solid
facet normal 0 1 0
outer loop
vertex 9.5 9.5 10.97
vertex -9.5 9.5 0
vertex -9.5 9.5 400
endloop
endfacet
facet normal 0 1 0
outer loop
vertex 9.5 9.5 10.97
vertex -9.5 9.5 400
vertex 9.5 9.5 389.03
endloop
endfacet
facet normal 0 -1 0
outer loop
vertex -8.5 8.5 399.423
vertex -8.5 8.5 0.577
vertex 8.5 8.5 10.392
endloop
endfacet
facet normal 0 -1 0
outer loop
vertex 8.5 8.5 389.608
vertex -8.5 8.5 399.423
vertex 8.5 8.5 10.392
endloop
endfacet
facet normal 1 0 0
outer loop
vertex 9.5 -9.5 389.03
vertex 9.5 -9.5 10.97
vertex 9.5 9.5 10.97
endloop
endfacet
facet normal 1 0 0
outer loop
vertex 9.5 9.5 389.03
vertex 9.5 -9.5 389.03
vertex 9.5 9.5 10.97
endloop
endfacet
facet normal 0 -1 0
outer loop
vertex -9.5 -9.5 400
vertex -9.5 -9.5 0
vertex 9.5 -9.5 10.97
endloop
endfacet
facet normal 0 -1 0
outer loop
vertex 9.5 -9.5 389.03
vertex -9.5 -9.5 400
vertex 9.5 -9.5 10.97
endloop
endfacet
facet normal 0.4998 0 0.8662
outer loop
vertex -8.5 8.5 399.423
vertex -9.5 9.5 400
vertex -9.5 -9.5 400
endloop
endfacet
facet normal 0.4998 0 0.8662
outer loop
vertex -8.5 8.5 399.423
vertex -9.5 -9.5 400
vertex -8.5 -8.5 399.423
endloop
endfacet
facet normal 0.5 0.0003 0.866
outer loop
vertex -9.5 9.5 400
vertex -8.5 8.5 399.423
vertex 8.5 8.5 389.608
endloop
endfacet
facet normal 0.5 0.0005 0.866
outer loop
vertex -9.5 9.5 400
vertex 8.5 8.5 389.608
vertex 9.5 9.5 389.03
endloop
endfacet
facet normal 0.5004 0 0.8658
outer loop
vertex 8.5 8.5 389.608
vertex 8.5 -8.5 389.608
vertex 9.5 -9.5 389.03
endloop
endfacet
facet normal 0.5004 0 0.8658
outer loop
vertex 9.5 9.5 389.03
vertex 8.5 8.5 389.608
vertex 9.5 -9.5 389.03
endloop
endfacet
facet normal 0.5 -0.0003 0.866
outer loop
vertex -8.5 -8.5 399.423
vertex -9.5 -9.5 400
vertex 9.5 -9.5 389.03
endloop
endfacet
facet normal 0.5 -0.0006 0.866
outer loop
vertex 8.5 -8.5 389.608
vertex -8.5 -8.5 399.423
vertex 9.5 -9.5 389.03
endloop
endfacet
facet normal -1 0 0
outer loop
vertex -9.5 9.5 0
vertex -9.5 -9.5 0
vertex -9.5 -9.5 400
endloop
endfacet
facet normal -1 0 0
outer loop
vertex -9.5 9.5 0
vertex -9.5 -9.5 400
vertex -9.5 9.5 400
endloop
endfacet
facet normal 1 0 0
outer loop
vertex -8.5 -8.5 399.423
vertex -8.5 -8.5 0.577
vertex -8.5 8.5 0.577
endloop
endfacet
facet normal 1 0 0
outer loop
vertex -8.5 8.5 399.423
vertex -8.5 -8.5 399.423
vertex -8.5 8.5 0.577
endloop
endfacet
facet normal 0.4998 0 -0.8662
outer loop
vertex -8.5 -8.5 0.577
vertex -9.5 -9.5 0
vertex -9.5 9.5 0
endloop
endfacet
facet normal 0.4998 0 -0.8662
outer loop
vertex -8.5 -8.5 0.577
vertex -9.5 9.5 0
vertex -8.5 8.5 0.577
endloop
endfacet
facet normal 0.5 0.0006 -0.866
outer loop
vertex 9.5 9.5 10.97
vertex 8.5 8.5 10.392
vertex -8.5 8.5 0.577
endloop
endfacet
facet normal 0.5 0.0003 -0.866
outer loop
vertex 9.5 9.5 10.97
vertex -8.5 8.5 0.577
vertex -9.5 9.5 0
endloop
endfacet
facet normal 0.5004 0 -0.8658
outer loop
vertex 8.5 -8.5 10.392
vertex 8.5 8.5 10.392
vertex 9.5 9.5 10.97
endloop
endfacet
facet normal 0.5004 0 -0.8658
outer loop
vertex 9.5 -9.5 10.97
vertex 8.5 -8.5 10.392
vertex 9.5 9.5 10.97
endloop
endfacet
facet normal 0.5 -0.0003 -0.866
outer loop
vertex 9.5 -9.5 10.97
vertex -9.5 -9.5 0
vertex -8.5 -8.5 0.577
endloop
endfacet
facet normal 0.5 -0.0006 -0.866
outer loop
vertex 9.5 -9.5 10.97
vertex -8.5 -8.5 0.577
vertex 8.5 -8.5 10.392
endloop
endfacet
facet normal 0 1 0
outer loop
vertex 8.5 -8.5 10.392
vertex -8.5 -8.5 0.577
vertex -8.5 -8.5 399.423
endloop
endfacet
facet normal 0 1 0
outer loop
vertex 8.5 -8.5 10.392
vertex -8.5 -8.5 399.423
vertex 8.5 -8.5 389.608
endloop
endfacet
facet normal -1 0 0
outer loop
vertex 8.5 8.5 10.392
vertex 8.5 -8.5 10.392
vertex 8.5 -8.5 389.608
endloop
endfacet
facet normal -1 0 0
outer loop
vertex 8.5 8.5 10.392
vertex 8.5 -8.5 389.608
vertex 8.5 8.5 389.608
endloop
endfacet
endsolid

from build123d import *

# Parameters (mm, degrees)
SKETCH1_W               = 19
SKETCH1_H               = 19
SKETCH1_W_2             = 17
SKETCH1_H_2             = 17
BOSS_EXTRUDE1_DEPTH     = 400
CUT_EXTRUDE3_DEPTH      = 1
CUT_EXTRUDE3_DEPTH_BACK = 20
CUT_EXTRUDE4_DEPTH      = 1
CUT_EXTRUDE4_DEPTH_BACK = 20


with BuildPart() as part:
    # Sketch1 → Boss-Extrude1 (new body)
    with BuildSketch(Plane.XY):
        Rectangle(SKETCH1_W, SKETCH1_H)
        Rectangle(SKETCH1_W_2, SKETCH1_H_2, mode=Mode.SUBTRACT)
    extrude(amount=BOSS_EXTRUDE1_DEPTH)

    # Sketch2 → Cut-Extrude3 (cut, two sides)
    with BuildSketch(Plane.XZ.offset(9.5)) as cut_extrude3_sk:
        Polygon((-711.761724625, -405.450995754), (-9.5, 0), (9.5, 10.969655115), (711.761724625, 416.420650868), (1522.663716132, -988.102798381), (99.140266883, -1809.974445003), align=None)
    extrude(amount=CUT_EXTRUDE3_DEPTH, mode=Mode.SUBTRACT)
    extrude(cut_extrude3_sk.sketch, amount=-CUT_EXTRUDE3_DEPTH_BACK, mode=Mode.SUBTRACT)

    # Sketch3 → Cut-Extrude4 (cut, two sides)
    with BuildSketch(Plane(origin=(0, -9.5, 0), x_dir=(-1, 0, 0), z_dir=(0, -1, 0))) as cut_extrude4_sk:
        Polygon((711.761724625, -805.450995754), (9.5, -400), (-9.5, -389.030344885), (-711.761724625, 16.420650868), (-1522.663716132, -1388.102798381), (-99.140266883, -2209.974445003), align=None)
    extrude(amount=CUT_EXTRUDE4_DEPTH, mode=Mode.SUBTRACT)
    extrude(cut_extrude4_sk.sketch, amount=-CUT_EXTRUDE4_DEPTH_BACK, mode=Mode.SUBTRACT)


solid = part.part
